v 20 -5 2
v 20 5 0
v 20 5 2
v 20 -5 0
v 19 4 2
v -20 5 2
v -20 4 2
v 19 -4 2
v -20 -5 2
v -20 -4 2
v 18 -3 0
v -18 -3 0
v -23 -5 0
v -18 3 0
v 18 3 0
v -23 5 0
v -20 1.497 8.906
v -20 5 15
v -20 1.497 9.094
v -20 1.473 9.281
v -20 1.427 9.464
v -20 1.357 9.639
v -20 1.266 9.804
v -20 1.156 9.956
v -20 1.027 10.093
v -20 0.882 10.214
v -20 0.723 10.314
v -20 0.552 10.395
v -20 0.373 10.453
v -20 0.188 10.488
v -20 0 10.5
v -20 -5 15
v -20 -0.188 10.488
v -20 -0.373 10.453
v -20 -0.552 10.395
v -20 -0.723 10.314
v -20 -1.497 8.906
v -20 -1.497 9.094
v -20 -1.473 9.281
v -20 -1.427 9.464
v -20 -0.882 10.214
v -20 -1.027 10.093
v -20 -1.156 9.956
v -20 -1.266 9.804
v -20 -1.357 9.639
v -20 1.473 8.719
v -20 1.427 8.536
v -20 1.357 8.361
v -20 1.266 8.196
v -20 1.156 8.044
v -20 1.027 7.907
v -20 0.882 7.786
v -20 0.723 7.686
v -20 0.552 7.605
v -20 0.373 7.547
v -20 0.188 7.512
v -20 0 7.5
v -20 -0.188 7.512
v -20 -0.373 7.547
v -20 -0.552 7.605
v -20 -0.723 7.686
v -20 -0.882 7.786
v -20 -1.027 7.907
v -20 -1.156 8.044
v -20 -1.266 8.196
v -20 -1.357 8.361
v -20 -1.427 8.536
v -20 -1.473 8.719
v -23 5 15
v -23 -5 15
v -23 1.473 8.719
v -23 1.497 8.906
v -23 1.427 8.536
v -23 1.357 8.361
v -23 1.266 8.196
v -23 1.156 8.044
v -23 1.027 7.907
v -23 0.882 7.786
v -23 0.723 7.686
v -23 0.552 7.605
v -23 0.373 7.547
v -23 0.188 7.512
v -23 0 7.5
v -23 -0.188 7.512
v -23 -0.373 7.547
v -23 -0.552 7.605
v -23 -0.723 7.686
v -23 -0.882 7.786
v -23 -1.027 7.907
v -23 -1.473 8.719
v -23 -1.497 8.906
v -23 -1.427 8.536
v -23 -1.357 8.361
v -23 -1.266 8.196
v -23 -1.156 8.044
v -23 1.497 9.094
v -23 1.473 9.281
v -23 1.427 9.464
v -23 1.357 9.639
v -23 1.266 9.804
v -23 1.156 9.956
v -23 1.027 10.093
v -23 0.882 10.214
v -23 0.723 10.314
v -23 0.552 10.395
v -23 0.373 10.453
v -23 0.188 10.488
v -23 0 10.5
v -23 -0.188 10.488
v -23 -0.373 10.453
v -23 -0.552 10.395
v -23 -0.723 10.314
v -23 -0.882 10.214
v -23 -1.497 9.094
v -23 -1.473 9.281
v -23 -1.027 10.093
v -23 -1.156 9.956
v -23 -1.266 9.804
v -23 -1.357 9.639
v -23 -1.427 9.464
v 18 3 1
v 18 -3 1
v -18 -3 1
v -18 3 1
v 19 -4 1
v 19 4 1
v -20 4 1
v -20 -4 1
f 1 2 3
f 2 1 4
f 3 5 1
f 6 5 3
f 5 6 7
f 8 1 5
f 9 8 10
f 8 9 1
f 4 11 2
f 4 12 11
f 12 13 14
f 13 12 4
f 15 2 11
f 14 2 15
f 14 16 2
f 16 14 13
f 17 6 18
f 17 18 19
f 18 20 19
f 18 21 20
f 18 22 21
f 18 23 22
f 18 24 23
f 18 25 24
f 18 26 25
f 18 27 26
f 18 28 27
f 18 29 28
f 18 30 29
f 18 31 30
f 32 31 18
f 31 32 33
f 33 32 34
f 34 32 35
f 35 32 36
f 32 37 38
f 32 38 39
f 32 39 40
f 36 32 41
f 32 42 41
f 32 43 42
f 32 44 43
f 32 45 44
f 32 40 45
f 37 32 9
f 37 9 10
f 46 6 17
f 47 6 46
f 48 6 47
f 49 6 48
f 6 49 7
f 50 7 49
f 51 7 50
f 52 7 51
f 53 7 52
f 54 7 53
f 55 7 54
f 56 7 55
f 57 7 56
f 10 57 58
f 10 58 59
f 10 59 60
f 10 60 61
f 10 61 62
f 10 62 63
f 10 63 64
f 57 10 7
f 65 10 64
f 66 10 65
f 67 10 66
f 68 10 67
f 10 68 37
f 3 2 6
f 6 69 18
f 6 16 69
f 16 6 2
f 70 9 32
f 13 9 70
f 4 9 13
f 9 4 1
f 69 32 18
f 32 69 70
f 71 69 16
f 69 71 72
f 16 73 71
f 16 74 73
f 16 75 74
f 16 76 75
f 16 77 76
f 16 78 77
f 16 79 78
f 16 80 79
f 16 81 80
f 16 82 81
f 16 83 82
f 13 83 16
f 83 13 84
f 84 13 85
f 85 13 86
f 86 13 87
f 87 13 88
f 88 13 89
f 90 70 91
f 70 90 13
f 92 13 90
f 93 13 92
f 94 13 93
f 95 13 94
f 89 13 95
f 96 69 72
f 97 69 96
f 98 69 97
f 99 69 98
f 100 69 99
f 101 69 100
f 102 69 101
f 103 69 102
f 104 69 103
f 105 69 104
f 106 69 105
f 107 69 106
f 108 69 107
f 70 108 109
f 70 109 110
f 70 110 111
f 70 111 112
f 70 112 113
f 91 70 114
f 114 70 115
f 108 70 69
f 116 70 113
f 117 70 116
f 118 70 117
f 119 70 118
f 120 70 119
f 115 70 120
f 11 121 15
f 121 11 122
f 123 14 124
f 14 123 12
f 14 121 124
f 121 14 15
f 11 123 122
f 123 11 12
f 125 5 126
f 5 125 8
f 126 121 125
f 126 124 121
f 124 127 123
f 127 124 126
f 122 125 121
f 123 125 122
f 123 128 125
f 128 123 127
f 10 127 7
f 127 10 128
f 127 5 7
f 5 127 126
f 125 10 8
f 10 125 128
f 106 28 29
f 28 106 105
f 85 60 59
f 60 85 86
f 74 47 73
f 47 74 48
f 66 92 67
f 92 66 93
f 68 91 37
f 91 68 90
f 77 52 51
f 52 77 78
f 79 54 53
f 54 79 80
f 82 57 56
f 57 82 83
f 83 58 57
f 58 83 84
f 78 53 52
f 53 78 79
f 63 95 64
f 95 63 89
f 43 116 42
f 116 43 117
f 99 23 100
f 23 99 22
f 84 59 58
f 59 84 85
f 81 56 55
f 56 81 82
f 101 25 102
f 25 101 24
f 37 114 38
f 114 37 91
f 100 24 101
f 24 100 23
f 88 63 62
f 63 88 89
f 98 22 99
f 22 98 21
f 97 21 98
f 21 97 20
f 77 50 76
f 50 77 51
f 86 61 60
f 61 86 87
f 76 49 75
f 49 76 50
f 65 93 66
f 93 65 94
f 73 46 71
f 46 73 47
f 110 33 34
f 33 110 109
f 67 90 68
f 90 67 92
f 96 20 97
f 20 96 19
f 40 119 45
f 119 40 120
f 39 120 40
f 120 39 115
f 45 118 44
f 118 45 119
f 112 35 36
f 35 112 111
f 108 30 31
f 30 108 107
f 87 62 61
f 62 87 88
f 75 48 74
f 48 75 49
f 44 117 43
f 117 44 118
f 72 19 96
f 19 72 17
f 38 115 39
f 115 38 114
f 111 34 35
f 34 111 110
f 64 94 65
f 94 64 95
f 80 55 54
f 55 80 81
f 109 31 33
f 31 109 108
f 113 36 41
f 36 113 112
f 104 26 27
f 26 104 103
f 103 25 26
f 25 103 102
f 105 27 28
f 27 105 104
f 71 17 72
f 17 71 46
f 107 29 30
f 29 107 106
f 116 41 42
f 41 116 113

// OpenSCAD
$fn = 50;


difference() {
	union() {
		translate(v = [-20.0000000000, -5.0000000000, 0]) {
			rotate(a = [0, 0, 0]) {
				cube(size = [40, 10, 2]);
			}
		}
		translate(v = [-23.0000000000, -5.0000000000, 0]) {
			rotate(a = [0, 0, 0]) {
				cube(size = [3, 10, 15]);
			}
		}
	}
	union() {
		translate(v = [-18.0000000000, -3.0000000000, 0]) {
			rotate(a = [0, 0, 0]) {
				cube(size = [36, 6, 2]);
			}
		}
		translate(v = [-20.0000000000, -4.0000000000, 1]) {
			rotate(a = [0, 0, 0]) {
				cube(size = [39, 8, 1]);
			}
		}
		#translate(v = [-30.0000000000, 0, 9]) {
			rotate(a = [0, 90, 0]) {
				cylinder(h = 20, r = 1.5000000000);
			}
		}
	}
}
